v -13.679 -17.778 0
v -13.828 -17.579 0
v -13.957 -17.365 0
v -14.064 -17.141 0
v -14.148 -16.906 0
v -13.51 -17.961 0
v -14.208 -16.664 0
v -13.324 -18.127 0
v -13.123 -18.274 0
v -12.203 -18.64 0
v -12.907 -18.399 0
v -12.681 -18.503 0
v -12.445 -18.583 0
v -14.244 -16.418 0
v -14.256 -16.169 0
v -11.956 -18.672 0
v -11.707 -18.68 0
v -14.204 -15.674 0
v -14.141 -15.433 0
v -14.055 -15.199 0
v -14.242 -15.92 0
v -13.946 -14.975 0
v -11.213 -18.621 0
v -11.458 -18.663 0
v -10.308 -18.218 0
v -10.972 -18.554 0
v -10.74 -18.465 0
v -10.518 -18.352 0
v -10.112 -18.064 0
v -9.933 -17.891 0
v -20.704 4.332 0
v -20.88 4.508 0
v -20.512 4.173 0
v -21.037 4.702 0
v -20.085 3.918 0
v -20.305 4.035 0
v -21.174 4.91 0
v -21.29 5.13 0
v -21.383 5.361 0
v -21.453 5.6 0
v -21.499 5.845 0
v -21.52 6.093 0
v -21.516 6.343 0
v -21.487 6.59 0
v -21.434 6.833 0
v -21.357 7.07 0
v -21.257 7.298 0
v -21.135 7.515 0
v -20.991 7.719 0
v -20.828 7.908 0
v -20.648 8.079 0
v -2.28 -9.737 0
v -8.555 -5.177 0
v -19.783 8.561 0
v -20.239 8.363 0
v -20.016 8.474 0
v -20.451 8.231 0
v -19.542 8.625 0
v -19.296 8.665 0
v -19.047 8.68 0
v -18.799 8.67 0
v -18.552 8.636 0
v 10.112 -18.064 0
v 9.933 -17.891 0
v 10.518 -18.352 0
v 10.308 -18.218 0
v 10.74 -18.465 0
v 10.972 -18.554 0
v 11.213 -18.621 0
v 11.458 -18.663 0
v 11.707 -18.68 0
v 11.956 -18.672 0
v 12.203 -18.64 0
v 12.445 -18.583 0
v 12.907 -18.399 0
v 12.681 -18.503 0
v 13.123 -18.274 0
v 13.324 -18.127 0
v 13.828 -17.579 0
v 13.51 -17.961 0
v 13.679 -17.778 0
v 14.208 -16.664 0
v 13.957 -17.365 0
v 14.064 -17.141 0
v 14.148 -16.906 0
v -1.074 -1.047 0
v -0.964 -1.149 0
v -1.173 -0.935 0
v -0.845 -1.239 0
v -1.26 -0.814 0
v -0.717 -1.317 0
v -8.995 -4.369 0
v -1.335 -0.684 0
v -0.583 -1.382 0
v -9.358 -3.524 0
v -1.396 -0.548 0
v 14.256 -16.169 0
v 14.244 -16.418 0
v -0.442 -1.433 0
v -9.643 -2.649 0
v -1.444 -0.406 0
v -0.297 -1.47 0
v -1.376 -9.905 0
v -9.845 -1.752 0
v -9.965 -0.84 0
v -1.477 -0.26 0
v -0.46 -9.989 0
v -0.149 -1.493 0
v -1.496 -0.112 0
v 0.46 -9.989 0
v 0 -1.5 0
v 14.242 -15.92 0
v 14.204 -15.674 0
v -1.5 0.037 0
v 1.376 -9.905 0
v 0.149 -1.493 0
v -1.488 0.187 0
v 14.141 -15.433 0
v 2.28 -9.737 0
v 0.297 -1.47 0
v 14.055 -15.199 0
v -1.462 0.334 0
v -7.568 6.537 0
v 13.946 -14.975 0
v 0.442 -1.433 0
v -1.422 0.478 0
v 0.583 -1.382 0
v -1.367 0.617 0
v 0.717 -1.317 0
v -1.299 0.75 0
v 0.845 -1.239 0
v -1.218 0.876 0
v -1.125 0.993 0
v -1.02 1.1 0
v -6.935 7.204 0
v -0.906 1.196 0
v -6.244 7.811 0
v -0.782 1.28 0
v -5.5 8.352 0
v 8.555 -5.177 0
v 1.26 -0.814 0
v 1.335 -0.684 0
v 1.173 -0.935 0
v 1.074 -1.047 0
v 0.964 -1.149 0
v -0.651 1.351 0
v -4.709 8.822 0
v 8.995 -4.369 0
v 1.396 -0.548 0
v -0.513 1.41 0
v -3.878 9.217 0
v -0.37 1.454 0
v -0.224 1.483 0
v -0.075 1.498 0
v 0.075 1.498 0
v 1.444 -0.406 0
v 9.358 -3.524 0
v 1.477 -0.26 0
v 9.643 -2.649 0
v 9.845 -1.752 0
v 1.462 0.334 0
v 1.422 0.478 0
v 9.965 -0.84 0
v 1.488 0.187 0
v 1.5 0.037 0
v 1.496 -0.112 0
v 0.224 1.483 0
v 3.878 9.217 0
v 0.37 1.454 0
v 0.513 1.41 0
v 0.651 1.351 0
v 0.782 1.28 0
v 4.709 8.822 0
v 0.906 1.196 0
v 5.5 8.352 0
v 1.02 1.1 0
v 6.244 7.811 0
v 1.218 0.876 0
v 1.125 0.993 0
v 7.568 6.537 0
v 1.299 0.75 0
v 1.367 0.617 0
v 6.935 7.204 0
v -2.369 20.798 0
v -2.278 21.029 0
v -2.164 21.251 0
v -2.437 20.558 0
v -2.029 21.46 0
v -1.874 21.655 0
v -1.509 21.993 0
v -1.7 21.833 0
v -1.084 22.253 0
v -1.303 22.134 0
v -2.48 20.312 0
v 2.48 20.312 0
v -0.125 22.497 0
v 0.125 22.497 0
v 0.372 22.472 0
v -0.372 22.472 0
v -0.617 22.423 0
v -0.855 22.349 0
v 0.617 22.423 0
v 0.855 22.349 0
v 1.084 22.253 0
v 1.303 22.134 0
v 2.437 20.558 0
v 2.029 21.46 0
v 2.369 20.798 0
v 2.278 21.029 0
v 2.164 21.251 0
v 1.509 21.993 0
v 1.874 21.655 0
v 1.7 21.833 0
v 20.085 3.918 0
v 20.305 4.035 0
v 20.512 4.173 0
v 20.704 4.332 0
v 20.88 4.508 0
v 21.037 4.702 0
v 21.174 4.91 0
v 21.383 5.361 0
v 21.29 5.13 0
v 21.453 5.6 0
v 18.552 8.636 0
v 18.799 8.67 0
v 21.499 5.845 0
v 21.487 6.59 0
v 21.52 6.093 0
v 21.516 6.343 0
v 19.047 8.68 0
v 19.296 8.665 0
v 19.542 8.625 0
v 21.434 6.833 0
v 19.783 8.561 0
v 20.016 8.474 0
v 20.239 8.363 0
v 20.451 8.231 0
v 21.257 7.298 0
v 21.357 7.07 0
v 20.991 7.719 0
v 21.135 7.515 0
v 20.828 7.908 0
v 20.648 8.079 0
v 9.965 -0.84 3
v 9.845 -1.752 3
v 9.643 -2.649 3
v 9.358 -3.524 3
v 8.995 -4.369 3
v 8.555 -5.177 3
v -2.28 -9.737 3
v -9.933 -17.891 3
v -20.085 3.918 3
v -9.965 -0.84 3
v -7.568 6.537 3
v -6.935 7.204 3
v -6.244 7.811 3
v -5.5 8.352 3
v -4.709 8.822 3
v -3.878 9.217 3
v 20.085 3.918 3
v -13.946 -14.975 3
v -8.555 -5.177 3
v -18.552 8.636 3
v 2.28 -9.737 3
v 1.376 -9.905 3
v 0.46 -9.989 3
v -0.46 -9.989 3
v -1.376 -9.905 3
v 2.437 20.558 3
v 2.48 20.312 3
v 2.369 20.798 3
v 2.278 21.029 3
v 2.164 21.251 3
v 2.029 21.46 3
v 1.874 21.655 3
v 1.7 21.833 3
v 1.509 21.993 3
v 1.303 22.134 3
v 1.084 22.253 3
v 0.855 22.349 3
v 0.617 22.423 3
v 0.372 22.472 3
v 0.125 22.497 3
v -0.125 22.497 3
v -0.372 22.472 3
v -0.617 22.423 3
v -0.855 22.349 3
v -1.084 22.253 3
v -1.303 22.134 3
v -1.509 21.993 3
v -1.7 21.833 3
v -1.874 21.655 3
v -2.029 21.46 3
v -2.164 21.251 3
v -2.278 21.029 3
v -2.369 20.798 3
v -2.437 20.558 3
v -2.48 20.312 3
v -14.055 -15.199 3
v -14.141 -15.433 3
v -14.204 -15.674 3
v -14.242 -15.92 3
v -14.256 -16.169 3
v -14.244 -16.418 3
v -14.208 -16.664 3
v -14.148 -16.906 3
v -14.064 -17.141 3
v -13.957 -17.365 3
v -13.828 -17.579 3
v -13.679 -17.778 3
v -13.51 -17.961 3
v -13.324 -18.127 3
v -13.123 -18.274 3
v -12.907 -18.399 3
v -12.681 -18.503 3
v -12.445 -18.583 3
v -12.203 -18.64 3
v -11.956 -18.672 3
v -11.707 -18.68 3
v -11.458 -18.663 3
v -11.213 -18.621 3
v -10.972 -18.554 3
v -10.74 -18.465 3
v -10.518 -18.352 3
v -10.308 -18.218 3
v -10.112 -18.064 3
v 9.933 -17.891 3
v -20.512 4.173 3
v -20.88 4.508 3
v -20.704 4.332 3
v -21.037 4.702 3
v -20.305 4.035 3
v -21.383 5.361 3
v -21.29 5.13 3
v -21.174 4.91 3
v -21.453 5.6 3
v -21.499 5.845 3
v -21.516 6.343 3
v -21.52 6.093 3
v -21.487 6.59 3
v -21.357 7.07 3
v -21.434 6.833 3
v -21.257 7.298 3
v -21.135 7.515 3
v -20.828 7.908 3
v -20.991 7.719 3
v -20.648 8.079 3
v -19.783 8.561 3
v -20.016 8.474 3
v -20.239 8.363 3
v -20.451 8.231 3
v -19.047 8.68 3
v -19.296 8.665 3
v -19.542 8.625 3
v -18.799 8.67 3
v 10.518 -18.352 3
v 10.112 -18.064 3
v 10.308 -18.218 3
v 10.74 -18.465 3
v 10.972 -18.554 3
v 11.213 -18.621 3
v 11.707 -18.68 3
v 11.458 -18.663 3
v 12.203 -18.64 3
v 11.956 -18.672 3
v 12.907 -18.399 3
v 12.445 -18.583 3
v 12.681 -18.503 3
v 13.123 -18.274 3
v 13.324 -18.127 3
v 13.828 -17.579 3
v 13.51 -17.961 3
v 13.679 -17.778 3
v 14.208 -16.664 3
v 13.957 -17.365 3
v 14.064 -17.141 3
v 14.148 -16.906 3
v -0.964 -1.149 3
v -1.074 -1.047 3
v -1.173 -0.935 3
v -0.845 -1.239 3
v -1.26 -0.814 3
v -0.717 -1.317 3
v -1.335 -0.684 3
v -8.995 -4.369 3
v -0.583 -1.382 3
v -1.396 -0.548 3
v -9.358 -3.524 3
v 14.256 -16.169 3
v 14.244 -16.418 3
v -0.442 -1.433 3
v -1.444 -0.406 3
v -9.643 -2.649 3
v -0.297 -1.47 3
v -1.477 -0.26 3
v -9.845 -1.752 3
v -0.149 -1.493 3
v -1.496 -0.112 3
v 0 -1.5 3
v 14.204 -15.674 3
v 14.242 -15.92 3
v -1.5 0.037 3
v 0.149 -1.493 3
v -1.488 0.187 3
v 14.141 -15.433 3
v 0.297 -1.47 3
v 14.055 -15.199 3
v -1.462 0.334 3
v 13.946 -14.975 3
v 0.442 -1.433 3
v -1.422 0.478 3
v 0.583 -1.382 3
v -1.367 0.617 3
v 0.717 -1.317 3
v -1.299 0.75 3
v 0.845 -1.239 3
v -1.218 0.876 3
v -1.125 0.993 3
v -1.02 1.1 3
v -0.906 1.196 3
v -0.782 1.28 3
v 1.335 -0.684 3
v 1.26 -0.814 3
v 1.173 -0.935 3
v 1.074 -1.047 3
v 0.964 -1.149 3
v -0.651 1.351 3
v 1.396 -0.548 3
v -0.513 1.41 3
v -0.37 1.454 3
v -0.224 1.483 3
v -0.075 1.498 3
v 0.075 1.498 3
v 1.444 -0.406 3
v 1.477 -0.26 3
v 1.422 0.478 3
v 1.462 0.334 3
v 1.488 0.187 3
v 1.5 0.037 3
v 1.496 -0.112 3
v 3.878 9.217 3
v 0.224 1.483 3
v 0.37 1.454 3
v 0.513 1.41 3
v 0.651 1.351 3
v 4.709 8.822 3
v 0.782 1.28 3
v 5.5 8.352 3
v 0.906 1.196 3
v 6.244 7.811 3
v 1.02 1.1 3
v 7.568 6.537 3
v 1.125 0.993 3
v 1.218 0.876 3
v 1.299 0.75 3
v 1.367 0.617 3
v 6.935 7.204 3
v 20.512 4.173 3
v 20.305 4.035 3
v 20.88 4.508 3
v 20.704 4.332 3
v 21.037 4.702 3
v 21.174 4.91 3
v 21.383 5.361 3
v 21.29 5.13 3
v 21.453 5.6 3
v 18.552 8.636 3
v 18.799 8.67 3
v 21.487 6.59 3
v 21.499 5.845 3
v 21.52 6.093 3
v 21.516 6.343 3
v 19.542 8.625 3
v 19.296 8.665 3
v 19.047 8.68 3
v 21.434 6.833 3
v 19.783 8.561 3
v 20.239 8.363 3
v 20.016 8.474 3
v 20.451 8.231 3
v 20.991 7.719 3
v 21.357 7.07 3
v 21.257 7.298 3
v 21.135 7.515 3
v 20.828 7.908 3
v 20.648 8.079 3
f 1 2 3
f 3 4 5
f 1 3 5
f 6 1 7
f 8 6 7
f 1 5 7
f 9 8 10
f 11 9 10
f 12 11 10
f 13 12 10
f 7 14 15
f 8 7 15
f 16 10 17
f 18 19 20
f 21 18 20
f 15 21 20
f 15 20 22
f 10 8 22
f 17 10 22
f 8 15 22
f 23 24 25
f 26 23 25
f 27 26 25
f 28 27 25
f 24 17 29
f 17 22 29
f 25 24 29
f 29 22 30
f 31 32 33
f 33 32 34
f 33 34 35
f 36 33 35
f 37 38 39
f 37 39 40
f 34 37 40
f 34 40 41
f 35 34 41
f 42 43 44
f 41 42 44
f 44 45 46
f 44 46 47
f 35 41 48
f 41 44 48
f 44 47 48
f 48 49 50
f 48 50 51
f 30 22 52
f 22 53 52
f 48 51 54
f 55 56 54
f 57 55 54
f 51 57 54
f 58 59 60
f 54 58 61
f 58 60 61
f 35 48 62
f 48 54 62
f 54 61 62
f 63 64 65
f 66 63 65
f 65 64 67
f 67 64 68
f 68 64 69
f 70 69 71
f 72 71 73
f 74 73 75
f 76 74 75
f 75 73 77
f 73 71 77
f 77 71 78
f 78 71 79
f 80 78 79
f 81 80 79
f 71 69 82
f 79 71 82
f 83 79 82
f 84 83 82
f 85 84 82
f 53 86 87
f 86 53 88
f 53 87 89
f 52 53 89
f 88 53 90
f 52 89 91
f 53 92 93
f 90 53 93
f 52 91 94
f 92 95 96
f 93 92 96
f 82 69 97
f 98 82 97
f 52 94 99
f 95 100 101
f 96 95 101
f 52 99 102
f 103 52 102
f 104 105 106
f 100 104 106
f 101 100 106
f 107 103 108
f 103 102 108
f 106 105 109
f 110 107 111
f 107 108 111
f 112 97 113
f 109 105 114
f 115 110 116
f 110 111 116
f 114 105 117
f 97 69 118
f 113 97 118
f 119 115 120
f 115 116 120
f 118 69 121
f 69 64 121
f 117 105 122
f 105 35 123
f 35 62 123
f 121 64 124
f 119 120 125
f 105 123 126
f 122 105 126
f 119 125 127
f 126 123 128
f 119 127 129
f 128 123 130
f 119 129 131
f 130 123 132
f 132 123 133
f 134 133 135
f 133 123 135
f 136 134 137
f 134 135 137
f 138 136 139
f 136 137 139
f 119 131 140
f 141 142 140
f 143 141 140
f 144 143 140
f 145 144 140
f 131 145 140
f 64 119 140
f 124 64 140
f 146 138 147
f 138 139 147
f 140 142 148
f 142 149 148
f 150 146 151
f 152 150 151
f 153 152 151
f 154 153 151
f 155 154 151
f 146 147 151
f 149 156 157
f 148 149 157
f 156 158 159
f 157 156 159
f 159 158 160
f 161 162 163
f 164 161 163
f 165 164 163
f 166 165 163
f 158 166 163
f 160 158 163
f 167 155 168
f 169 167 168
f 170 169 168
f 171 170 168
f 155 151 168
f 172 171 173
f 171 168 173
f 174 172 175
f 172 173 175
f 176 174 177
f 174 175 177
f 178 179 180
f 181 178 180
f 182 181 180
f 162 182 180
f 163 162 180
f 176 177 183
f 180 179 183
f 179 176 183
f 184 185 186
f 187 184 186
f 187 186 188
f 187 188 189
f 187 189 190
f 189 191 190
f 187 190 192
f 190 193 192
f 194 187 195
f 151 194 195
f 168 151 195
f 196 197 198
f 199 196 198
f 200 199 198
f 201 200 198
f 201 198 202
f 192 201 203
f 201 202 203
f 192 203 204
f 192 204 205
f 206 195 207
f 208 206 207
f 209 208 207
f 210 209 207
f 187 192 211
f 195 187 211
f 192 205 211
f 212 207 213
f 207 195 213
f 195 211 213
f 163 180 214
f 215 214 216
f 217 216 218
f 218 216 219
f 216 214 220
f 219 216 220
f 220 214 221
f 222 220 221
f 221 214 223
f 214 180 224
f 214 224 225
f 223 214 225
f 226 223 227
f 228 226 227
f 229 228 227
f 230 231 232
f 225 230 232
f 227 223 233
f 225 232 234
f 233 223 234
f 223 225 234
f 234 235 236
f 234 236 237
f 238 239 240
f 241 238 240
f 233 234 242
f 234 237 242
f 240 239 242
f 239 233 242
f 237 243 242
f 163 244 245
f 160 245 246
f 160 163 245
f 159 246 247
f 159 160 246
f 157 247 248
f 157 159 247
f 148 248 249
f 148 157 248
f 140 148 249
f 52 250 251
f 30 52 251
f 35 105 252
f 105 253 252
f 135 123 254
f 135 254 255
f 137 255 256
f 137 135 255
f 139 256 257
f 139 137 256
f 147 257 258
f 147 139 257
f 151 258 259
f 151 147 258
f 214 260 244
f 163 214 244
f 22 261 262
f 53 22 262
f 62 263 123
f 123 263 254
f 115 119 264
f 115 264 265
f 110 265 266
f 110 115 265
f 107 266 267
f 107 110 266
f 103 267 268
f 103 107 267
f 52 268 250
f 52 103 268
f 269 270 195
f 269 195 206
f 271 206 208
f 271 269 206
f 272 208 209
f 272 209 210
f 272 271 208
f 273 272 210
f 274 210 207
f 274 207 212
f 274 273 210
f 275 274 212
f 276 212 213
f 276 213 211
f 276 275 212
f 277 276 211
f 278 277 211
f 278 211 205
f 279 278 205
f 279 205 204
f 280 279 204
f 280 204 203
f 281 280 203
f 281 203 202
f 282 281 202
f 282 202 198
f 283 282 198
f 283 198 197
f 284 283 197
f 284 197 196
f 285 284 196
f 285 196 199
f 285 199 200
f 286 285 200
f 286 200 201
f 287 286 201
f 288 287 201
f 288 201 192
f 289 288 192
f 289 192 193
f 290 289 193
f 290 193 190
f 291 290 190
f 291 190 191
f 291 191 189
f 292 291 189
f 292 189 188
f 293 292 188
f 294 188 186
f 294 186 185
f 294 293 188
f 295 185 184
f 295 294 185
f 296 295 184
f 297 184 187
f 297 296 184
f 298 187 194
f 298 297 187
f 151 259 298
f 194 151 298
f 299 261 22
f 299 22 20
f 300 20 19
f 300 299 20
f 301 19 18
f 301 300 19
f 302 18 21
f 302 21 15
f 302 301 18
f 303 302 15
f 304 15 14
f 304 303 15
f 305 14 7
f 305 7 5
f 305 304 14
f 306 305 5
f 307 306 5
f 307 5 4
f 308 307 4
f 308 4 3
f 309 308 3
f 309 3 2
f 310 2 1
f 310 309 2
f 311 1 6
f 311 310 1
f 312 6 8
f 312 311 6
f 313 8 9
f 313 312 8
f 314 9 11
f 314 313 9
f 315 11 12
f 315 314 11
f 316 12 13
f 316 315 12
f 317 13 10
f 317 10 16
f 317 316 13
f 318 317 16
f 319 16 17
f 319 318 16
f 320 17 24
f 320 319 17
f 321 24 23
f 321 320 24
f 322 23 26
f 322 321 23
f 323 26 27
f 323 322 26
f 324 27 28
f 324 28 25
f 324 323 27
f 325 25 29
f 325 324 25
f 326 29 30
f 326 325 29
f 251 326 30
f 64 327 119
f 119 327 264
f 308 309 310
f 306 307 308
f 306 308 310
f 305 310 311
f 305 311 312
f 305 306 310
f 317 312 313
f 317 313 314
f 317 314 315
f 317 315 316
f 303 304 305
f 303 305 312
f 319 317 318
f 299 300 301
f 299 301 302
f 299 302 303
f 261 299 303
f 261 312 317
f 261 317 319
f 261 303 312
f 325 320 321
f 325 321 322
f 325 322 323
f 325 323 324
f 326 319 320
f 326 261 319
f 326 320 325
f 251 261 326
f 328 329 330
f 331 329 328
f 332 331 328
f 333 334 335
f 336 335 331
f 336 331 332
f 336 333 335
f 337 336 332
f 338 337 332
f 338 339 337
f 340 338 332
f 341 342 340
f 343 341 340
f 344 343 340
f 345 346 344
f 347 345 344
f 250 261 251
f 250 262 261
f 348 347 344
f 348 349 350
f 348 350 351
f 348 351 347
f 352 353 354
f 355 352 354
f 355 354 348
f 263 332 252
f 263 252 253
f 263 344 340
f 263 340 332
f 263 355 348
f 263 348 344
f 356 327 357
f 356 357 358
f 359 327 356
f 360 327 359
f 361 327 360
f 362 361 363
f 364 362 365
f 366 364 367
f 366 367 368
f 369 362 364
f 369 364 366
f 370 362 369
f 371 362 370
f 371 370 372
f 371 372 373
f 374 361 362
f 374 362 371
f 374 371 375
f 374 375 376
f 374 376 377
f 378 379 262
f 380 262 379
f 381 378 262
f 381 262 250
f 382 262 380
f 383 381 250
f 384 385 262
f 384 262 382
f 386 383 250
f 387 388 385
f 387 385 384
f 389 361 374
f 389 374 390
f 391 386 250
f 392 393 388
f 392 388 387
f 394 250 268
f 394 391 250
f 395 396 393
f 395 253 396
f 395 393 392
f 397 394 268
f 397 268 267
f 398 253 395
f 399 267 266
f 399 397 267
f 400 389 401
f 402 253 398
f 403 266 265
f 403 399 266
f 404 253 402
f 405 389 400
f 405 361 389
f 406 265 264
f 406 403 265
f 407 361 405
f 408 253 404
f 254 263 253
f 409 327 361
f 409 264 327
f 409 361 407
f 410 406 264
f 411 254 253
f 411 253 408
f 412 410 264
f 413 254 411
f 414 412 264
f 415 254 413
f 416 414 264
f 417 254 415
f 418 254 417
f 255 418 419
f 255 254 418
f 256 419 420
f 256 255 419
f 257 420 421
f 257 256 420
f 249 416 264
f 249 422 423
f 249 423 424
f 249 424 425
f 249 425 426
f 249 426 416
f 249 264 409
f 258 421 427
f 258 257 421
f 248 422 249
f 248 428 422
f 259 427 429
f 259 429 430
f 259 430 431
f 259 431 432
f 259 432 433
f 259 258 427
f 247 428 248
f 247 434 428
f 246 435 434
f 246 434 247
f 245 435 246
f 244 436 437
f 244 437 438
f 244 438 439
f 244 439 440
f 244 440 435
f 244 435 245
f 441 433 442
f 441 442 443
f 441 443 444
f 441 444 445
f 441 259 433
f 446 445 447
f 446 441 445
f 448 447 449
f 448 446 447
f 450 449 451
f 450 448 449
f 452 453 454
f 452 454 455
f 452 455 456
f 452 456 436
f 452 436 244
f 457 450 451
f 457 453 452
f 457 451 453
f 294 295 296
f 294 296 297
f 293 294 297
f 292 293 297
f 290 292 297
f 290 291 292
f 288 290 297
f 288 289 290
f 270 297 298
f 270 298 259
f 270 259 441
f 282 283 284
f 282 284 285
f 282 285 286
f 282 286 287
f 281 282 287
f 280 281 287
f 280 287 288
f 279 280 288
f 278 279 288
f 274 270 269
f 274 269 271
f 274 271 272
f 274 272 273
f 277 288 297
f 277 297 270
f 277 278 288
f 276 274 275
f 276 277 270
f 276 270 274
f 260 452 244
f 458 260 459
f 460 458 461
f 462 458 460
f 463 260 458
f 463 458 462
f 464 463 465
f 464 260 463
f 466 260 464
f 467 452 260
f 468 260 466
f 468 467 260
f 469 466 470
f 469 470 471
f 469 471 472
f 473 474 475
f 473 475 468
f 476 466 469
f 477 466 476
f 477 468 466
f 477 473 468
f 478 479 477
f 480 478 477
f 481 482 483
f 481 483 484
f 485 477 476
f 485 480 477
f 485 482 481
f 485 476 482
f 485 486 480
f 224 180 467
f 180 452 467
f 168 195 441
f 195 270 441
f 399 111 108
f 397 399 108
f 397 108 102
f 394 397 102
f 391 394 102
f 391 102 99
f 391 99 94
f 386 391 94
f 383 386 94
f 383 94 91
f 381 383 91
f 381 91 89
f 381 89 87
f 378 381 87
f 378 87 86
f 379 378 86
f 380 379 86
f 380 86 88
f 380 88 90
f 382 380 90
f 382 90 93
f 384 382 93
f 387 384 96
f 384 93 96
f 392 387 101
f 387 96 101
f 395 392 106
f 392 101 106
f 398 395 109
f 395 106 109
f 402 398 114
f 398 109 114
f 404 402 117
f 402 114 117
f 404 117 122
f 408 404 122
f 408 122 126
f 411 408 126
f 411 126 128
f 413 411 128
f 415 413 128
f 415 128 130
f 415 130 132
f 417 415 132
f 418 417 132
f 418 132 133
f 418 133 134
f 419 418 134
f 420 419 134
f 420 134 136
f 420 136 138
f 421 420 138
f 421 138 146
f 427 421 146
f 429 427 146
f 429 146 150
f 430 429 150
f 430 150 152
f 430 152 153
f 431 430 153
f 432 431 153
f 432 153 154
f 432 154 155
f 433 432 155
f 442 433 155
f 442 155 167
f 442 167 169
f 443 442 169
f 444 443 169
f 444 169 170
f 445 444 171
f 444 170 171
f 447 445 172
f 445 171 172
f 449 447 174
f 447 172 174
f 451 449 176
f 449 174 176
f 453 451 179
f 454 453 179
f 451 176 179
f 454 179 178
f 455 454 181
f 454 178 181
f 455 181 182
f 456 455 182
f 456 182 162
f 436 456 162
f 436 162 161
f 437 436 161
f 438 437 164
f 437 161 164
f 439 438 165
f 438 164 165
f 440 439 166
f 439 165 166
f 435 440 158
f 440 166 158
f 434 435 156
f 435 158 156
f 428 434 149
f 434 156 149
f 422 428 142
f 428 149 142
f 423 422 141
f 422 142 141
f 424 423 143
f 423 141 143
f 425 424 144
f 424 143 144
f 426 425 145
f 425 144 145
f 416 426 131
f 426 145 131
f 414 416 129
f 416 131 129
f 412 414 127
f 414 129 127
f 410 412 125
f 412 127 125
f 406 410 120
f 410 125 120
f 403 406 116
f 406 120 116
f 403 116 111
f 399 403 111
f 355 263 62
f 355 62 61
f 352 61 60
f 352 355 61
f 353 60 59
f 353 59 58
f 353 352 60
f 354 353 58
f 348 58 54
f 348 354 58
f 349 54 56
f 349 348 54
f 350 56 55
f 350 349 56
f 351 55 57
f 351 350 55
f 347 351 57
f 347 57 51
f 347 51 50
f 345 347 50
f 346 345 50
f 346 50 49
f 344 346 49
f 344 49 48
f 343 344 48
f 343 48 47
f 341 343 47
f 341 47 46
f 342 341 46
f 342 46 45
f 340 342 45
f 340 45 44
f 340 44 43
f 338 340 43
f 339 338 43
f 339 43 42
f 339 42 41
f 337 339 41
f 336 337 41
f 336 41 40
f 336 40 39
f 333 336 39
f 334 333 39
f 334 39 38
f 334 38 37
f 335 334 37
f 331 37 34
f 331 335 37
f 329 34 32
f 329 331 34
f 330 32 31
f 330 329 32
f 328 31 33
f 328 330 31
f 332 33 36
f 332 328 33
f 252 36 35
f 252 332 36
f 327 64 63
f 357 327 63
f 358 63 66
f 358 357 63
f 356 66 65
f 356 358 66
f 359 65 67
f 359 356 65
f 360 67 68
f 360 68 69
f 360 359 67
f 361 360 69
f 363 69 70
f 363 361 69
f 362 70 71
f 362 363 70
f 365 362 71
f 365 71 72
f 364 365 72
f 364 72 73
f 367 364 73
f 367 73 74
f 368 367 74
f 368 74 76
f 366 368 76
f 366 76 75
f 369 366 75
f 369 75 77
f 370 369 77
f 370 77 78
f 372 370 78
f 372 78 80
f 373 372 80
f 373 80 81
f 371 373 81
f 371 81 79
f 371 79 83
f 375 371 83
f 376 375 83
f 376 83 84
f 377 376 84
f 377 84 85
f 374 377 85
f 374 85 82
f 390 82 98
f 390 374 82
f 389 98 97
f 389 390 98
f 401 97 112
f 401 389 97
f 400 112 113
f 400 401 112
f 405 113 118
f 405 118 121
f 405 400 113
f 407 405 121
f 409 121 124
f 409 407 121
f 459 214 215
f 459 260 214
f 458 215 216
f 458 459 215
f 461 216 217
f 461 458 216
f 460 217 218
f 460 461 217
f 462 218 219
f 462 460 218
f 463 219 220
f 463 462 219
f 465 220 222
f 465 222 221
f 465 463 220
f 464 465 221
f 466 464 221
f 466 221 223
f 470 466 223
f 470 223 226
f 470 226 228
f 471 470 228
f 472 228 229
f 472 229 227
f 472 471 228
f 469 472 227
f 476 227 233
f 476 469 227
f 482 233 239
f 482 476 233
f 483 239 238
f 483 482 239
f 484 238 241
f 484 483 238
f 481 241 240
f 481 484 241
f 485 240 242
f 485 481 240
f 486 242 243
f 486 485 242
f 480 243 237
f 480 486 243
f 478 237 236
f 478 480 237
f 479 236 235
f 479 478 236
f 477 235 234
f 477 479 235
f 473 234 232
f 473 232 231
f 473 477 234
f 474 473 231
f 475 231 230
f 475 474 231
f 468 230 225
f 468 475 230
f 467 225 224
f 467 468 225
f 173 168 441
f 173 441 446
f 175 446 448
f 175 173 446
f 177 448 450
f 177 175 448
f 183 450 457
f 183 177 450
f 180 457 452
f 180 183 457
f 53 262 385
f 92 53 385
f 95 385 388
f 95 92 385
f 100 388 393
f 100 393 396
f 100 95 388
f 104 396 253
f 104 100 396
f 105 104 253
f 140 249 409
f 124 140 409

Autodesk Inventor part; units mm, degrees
ref_plane "YZ Plane" through (0, 0, 0) normal (1, 0, 0) x (0, 1, 0)
ref_plane "XZ Plane" through (0, 0, 0) normal (0, 1, 0) x (-1, 0, 0)
ref_plane "XY Plane" through (0, 0, 0) normal (0, 0, 1) x (1, 0, 0)
sketch "Sketch1" plane through (0, 0, 0) normal (0, 0, 1) x (1, 0, 0)
  circle A0 centre (0, 0) radius 10
  dimension "d0" = 20
extrude "Extrusion1" add sketch "Sketch1" along normal blind 3
sketch "Sketch2" plane through (0, 0, 3) normal (0, 0, 1) x (1, 0, 0)
  point P0 (0, 0)
  point P1 (0, 0)
hole "Hole1" at (0, 0, 3) direction (0, 0, -1) diameter 3 end through all
sketch "Sketch4" plane through (0, 0, 3) normal (0, 0, 1) x (1, 0, 0)
  circle A0 centre (0, 0) radius 10 projected
  circle A1 centre (0, 20) radius 2.5
  circle A2 centre (0, 0) radius 1.5 projected
  circle A3 centre (0, 0) radius 5
  line L0 (-4.9608, 0.625) -> (-2.4804, 20.3125)
  line L1 (2.4804, 20.3125) -> (4.9608, 0.625)
  dimension "d17" = 20
  dimension "d25" = 5
  dimension "d26" = 20
  dimension "d27" = 10
extrude "Extrusion2" add sketch "Sketch4" against normal up to surface (3 mm away) contours L1 A3 L0 A0 | A0 L0 A1 L1 | A1 picked at (-0.6594, 8.2675)
pattern_circular "Circular Pattern1" count 5 over 360 about axis through (0, 0, -10) along (0, 0, 1) of "Extrusion2"
properties part number "Selection_Gear 1" material "Nylon 6/6"
